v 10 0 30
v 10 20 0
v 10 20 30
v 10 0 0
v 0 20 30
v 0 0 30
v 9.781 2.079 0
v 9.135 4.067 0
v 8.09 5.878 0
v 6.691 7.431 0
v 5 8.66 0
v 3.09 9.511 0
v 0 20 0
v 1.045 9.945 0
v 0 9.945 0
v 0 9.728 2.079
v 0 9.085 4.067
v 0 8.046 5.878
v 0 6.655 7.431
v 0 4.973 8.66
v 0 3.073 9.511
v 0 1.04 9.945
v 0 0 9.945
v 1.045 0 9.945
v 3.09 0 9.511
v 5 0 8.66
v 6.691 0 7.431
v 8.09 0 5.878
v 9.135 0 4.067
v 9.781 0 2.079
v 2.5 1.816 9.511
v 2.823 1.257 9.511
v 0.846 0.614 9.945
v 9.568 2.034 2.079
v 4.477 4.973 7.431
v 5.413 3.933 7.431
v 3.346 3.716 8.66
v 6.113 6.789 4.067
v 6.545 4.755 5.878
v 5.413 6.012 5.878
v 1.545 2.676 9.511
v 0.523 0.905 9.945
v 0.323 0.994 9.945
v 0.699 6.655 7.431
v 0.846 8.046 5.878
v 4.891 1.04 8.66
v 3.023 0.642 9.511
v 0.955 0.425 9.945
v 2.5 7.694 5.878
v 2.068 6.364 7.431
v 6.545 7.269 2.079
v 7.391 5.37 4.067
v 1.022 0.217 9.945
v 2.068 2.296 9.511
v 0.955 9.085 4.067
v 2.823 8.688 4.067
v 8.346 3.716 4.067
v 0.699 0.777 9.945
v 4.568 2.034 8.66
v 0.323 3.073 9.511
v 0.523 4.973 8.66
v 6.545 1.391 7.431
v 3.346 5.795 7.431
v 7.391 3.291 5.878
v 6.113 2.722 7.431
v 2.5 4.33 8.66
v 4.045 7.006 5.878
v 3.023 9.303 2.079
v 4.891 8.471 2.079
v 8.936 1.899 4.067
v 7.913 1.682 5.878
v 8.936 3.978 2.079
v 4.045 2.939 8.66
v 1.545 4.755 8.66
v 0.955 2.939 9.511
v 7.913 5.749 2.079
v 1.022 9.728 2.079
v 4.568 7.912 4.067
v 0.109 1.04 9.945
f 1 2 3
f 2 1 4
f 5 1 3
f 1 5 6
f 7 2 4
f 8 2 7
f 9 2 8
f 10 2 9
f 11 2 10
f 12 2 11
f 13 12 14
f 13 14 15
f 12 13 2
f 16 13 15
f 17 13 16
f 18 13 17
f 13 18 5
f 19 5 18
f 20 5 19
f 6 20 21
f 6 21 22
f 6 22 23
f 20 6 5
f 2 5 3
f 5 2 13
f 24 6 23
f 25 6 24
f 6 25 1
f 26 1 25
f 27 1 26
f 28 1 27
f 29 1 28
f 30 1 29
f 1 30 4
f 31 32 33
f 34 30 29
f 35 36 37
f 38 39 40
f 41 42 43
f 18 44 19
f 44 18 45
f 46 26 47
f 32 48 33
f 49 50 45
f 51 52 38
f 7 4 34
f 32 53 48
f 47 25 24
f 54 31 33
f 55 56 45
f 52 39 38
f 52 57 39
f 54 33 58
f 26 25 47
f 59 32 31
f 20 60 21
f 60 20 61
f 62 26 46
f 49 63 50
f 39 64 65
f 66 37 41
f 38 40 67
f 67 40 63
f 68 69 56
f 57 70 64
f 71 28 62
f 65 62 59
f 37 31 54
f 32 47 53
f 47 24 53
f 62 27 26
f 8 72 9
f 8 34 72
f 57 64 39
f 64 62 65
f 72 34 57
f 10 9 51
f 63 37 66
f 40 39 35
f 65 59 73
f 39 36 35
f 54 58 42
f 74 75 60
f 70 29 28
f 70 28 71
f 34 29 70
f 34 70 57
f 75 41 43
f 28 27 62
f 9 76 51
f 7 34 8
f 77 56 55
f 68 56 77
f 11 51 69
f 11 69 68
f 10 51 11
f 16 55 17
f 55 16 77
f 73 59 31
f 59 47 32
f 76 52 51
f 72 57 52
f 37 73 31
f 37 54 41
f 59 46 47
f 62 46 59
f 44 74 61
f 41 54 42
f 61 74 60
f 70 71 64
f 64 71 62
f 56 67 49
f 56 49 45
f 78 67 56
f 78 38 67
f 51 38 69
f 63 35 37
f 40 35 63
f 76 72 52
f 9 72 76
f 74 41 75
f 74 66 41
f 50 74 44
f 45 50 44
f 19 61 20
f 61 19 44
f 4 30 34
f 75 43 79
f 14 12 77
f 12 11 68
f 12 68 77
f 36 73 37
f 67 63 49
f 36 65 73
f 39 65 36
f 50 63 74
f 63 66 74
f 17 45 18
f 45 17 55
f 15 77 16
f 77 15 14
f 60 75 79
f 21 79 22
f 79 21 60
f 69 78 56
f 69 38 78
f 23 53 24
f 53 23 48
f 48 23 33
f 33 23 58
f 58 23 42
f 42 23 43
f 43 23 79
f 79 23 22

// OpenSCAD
difference() {
	cube(size = [10, 20, 30]);
	sphere(r = 10);
}
